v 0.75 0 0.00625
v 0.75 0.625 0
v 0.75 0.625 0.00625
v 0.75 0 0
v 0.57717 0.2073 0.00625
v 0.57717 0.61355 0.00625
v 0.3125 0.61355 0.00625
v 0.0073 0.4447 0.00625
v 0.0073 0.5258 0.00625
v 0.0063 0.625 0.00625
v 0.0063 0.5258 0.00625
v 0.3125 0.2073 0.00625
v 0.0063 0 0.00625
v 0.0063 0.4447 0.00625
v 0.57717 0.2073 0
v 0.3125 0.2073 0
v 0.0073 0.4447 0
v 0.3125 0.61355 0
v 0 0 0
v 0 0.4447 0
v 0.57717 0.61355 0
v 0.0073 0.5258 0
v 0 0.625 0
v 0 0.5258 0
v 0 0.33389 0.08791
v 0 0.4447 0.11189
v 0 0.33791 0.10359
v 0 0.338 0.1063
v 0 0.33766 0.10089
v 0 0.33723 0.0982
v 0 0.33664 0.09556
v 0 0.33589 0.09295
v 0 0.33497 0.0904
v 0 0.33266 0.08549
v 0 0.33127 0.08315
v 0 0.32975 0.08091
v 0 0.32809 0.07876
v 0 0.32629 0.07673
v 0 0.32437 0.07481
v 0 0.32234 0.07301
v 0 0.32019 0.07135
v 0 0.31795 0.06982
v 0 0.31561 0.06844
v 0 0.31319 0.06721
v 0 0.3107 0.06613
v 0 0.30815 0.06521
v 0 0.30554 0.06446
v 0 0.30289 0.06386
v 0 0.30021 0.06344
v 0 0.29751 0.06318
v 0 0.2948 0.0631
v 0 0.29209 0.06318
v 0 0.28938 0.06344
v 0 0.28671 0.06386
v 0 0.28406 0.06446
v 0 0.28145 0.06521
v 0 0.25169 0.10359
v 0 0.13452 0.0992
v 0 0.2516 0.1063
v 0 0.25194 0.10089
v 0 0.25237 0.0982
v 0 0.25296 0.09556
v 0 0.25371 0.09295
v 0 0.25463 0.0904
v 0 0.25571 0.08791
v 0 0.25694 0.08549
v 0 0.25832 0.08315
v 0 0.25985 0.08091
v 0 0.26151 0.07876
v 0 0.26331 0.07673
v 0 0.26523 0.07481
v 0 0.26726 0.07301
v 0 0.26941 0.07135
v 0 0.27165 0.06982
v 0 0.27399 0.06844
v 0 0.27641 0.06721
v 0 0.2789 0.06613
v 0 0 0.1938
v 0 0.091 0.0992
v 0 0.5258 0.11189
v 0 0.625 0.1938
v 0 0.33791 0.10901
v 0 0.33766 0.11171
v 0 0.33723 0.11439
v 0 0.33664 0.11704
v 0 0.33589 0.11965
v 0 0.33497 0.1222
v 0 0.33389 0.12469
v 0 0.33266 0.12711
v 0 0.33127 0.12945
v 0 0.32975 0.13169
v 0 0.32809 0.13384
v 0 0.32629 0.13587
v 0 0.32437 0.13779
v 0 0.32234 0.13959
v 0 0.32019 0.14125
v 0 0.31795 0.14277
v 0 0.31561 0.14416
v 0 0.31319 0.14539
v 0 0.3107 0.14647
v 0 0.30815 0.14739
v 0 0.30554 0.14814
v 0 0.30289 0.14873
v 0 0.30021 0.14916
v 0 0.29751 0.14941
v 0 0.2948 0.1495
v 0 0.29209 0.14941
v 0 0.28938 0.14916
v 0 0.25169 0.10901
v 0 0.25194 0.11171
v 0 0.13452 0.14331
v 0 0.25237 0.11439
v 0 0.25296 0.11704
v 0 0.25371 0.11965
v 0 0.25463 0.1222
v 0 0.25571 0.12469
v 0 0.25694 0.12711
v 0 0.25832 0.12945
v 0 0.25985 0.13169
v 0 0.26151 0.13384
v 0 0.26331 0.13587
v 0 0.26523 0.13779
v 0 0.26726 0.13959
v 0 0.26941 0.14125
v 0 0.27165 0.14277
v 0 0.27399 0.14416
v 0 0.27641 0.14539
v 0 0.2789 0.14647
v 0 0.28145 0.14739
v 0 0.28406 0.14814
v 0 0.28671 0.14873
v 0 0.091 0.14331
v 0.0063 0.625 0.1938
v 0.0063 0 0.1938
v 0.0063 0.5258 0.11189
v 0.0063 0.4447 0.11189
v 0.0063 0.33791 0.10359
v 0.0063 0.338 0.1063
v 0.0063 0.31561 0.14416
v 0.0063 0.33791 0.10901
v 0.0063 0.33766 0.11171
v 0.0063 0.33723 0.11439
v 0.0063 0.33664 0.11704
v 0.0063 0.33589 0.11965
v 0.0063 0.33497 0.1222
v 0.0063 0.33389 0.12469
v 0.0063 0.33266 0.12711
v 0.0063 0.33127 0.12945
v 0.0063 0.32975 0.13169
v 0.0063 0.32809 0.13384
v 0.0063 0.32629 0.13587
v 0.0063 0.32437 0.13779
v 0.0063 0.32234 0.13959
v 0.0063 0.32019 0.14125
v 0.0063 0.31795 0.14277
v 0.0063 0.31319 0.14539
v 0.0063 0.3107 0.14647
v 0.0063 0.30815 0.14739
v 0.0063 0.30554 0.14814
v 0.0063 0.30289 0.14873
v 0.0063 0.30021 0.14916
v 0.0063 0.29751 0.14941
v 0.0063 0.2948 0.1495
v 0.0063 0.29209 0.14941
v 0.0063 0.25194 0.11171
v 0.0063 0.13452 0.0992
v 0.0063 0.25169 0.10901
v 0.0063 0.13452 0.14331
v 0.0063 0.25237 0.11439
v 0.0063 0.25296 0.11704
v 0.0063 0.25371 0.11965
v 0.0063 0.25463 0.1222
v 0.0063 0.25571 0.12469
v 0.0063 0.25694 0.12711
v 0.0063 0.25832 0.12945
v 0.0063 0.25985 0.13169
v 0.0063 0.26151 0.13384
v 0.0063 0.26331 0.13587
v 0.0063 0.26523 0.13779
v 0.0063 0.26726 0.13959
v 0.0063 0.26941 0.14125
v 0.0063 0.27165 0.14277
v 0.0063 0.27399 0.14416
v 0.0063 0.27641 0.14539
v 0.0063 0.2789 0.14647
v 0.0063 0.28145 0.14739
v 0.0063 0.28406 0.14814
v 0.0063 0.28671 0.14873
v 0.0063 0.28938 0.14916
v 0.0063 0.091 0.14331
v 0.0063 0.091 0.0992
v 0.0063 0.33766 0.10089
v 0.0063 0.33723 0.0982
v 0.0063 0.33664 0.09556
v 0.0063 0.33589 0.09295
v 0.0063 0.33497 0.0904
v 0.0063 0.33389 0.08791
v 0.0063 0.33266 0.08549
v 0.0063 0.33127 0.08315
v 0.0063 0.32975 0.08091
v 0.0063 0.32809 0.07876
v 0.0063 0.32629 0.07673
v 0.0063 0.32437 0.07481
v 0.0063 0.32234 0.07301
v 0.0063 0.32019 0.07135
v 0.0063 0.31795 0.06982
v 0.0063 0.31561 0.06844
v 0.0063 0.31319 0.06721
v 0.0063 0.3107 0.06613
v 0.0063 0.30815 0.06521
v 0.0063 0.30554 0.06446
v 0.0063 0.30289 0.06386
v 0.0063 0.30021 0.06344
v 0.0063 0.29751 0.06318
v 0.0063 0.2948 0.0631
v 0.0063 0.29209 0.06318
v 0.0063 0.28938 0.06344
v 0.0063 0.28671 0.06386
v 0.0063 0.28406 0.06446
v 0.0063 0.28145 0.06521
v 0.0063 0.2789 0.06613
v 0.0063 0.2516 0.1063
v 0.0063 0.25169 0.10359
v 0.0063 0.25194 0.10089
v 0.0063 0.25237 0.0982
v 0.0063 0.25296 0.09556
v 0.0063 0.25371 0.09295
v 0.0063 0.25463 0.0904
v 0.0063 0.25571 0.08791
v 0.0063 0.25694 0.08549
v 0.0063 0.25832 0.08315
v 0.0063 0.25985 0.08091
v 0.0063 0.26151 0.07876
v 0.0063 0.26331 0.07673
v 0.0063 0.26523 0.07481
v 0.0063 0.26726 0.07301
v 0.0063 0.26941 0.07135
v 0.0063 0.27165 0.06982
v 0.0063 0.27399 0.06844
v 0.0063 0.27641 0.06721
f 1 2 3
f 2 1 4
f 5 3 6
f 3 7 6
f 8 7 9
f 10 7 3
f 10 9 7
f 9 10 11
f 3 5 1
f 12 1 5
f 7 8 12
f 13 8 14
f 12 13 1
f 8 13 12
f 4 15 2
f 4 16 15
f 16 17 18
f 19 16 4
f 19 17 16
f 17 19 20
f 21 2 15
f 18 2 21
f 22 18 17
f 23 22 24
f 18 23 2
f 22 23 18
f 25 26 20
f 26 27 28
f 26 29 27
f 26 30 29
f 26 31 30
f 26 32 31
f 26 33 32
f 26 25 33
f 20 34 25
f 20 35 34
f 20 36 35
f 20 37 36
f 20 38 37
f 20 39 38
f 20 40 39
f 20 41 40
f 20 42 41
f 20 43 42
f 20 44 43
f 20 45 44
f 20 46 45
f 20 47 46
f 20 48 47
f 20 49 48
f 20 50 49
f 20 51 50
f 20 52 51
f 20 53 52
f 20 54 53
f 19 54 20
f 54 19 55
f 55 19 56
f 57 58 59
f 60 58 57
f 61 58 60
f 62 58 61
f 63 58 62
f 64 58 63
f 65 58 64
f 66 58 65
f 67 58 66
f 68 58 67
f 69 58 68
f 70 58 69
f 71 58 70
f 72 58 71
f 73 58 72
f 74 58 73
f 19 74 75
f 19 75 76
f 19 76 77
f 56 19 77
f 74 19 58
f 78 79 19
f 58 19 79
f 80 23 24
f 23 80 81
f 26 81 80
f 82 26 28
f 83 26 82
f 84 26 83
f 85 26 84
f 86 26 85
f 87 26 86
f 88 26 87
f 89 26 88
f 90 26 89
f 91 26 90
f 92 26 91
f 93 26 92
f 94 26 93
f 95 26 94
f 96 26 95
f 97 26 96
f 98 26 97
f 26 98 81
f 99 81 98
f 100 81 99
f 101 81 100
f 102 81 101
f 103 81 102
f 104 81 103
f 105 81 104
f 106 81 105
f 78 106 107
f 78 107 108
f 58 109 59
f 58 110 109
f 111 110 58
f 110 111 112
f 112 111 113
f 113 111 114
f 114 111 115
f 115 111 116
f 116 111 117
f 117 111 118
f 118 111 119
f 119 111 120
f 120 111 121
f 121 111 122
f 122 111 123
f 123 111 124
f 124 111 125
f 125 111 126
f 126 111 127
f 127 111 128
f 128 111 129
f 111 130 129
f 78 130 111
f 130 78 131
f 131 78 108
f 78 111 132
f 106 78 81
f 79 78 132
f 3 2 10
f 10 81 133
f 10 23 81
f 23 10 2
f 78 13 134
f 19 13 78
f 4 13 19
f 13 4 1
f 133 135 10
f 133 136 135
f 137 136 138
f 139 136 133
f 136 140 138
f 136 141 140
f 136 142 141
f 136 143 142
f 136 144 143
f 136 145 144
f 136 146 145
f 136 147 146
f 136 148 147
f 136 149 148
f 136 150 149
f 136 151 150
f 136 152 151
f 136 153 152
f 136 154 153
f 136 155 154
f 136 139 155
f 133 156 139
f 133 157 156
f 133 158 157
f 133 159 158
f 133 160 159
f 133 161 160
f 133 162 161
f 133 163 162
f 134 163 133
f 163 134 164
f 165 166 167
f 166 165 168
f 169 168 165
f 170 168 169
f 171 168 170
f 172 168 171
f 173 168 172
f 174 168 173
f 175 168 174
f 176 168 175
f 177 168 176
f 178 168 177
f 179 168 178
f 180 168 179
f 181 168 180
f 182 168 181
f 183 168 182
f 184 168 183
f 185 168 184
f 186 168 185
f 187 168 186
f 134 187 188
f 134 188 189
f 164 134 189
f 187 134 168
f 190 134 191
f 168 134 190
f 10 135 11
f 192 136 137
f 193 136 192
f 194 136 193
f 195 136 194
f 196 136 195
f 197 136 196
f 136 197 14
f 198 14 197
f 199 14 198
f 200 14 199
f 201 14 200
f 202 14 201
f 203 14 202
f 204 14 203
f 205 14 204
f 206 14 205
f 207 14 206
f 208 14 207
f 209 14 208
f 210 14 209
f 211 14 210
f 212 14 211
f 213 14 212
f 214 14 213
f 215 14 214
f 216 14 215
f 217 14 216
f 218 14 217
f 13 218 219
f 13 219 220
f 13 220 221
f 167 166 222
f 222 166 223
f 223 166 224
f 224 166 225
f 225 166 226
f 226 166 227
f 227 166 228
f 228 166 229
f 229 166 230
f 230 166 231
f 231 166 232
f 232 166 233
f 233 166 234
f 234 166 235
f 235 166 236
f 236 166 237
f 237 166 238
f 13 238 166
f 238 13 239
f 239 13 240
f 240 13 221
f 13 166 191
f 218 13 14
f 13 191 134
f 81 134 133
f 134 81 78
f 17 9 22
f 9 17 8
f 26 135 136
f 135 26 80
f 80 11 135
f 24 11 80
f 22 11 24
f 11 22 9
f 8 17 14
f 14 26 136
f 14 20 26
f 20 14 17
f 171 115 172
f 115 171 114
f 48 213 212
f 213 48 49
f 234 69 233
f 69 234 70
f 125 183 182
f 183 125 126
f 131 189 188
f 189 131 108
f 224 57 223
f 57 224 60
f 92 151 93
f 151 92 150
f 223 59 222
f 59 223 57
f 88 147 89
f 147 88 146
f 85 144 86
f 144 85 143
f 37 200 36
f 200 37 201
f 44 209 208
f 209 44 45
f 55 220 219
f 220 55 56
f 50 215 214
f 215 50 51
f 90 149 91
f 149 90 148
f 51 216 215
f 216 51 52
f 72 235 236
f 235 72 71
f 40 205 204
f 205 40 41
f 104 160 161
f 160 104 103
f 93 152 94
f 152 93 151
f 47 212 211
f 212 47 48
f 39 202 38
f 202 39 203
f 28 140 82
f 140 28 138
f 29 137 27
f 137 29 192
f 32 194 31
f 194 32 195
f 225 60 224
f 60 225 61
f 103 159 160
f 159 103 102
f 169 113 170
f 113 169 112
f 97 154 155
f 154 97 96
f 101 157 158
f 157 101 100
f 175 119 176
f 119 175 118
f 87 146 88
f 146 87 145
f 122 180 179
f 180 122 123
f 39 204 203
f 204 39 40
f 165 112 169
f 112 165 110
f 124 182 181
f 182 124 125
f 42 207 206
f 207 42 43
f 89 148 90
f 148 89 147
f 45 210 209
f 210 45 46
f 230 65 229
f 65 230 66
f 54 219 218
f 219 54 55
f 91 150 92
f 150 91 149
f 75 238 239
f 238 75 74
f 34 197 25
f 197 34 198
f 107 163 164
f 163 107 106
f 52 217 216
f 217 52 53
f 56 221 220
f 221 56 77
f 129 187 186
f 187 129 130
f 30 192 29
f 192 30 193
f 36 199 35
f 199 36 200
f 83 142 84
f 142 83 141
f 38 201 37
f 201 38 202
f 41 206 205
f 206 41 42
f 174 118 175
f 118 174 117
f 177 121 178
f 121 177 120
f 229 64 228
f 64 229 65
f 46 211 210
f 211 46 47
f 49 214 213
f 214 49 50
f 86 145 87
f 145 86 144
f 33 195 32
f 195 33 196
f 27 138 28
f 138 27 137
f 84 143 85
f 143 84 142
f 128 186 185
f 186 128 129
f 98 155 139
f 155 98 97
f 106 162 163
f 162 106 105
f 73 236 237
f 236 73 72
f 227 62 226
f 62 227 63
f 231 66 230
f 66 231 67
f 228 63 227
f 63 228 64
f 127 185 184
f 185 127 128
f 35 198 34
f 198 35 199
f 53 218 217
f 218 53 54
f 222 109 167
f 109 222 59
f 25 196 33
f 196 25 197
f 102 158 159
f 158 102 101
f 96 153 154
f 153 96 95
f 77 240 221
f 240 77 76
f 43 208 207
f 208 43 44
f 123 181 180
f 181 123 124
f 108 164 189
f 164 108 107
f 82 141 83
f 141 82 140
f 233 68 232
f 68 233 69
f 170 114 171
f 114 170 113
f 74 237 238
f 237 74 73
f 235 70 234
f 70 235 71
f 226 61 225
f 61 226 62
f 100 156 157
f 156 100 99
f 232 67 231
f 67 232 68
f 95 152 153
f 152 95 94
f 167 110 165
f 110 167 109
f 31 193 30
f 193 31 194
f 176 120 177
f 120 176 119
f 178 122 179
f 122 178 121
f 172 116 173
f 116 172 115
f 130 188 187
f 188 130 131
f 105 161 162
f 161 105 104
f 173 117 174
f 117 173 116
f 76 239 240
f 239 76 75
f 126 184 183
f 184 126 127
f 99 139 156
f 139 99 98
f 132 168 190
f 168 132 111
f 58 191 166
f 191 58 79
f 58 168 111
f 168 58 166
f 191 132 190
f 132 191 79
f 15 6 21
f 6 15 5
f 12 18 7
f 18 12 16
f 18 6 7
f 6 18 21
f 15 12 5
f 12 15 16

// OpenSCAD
// Resolution for curved surfaces
$fn = 100;
// Small value to ensure clean boolean cuts (manifold geometry)
eps = 0.001;

// --- Parameters ---

// Base plate dimensions
base_length = 0.75;
base_width = 0.625;
base_thickness = 0.00625;

// Upright wall dimensions
wall_thickness = 0.0063;
wall_height = 0.1938;

// Cut 1: Lower rectangular opening in wall
cut1_y_span = 0.081103;
cut1_z_span = 0.111891;
cut1_y_offset = 0.4447;
cut1_z_offset = 0;

// Cut 2: Circular through-hole in wall
cut2_radius = 0.0432;
cut2_y_offset = 0.2948;
// Height band 0.0631 to 0.1495 means the center is at 0.0631 + radius
cut2_z_center = 0.0631 + cut2_radius; 
cut2_reach = 0.0625;

// Cut 3: Smaller rectangular opening in wall
cut3_y_span = 0.043521;
cut3_z_span = 0.044108;
cut3_y_offset = 0.091;
cut3_z_offset = 0.0992;
cut3_reach = 0.0625;

// Cut 4: Rectangular through opening in base
cut4_x_span = 0.264669;
cut4_y_span = 0.40625;
cut4_x_offset = 0.3125;
cut4_y_offset = 0.2073;
cut4_z_min = -0.0562;
cut4_z_max = 0.0063;

// --- Main Model ---

difference() {
    // 1. Solid Bodies (Base and Wall)
    union() {
        // Main rectangular base
        cube([base_length, base_width, base_thickness]);
        
        // Upright wall along the left edge (X=0)
        cube([wall_thickness, base_width, wall_height]);
    }

    // 2. Subtractive Features (Cuts and Holes)
    
    // Cut 1: Lower rectangular opening through the wall thickness
    translate([-eps, cut1_y_offset, cut1_z_offset - eps])
        cube([wall_thickness + 2*eps, cut1_y_span, cut1_z_span + eps]);

    // Cut 2: Circular through-hole in the wall
    translate([0, cut2_y_offset, cut2_z_center])
        rotate([0, 90, 0])
        cylinder(h=cut2_reach, r=cut2_radius, center=true);

    // Cut 3: Smaller rectangular through opening in the wall
    translate([-cut3_reach/2, cut3_y_offset, cut3_z_offset])
        cube([cut3_reach, cut3_y_span, cut3_z_span]);

    // Cut 4: Rectangular through opening in the horizontal base
    translate([cut4_x_offset, cut4_y_offset, cut4_z_min])
        cube([cut4_x_span, cut4_y_span, cut4_z_max - cut4_z_min + eps]);
}
